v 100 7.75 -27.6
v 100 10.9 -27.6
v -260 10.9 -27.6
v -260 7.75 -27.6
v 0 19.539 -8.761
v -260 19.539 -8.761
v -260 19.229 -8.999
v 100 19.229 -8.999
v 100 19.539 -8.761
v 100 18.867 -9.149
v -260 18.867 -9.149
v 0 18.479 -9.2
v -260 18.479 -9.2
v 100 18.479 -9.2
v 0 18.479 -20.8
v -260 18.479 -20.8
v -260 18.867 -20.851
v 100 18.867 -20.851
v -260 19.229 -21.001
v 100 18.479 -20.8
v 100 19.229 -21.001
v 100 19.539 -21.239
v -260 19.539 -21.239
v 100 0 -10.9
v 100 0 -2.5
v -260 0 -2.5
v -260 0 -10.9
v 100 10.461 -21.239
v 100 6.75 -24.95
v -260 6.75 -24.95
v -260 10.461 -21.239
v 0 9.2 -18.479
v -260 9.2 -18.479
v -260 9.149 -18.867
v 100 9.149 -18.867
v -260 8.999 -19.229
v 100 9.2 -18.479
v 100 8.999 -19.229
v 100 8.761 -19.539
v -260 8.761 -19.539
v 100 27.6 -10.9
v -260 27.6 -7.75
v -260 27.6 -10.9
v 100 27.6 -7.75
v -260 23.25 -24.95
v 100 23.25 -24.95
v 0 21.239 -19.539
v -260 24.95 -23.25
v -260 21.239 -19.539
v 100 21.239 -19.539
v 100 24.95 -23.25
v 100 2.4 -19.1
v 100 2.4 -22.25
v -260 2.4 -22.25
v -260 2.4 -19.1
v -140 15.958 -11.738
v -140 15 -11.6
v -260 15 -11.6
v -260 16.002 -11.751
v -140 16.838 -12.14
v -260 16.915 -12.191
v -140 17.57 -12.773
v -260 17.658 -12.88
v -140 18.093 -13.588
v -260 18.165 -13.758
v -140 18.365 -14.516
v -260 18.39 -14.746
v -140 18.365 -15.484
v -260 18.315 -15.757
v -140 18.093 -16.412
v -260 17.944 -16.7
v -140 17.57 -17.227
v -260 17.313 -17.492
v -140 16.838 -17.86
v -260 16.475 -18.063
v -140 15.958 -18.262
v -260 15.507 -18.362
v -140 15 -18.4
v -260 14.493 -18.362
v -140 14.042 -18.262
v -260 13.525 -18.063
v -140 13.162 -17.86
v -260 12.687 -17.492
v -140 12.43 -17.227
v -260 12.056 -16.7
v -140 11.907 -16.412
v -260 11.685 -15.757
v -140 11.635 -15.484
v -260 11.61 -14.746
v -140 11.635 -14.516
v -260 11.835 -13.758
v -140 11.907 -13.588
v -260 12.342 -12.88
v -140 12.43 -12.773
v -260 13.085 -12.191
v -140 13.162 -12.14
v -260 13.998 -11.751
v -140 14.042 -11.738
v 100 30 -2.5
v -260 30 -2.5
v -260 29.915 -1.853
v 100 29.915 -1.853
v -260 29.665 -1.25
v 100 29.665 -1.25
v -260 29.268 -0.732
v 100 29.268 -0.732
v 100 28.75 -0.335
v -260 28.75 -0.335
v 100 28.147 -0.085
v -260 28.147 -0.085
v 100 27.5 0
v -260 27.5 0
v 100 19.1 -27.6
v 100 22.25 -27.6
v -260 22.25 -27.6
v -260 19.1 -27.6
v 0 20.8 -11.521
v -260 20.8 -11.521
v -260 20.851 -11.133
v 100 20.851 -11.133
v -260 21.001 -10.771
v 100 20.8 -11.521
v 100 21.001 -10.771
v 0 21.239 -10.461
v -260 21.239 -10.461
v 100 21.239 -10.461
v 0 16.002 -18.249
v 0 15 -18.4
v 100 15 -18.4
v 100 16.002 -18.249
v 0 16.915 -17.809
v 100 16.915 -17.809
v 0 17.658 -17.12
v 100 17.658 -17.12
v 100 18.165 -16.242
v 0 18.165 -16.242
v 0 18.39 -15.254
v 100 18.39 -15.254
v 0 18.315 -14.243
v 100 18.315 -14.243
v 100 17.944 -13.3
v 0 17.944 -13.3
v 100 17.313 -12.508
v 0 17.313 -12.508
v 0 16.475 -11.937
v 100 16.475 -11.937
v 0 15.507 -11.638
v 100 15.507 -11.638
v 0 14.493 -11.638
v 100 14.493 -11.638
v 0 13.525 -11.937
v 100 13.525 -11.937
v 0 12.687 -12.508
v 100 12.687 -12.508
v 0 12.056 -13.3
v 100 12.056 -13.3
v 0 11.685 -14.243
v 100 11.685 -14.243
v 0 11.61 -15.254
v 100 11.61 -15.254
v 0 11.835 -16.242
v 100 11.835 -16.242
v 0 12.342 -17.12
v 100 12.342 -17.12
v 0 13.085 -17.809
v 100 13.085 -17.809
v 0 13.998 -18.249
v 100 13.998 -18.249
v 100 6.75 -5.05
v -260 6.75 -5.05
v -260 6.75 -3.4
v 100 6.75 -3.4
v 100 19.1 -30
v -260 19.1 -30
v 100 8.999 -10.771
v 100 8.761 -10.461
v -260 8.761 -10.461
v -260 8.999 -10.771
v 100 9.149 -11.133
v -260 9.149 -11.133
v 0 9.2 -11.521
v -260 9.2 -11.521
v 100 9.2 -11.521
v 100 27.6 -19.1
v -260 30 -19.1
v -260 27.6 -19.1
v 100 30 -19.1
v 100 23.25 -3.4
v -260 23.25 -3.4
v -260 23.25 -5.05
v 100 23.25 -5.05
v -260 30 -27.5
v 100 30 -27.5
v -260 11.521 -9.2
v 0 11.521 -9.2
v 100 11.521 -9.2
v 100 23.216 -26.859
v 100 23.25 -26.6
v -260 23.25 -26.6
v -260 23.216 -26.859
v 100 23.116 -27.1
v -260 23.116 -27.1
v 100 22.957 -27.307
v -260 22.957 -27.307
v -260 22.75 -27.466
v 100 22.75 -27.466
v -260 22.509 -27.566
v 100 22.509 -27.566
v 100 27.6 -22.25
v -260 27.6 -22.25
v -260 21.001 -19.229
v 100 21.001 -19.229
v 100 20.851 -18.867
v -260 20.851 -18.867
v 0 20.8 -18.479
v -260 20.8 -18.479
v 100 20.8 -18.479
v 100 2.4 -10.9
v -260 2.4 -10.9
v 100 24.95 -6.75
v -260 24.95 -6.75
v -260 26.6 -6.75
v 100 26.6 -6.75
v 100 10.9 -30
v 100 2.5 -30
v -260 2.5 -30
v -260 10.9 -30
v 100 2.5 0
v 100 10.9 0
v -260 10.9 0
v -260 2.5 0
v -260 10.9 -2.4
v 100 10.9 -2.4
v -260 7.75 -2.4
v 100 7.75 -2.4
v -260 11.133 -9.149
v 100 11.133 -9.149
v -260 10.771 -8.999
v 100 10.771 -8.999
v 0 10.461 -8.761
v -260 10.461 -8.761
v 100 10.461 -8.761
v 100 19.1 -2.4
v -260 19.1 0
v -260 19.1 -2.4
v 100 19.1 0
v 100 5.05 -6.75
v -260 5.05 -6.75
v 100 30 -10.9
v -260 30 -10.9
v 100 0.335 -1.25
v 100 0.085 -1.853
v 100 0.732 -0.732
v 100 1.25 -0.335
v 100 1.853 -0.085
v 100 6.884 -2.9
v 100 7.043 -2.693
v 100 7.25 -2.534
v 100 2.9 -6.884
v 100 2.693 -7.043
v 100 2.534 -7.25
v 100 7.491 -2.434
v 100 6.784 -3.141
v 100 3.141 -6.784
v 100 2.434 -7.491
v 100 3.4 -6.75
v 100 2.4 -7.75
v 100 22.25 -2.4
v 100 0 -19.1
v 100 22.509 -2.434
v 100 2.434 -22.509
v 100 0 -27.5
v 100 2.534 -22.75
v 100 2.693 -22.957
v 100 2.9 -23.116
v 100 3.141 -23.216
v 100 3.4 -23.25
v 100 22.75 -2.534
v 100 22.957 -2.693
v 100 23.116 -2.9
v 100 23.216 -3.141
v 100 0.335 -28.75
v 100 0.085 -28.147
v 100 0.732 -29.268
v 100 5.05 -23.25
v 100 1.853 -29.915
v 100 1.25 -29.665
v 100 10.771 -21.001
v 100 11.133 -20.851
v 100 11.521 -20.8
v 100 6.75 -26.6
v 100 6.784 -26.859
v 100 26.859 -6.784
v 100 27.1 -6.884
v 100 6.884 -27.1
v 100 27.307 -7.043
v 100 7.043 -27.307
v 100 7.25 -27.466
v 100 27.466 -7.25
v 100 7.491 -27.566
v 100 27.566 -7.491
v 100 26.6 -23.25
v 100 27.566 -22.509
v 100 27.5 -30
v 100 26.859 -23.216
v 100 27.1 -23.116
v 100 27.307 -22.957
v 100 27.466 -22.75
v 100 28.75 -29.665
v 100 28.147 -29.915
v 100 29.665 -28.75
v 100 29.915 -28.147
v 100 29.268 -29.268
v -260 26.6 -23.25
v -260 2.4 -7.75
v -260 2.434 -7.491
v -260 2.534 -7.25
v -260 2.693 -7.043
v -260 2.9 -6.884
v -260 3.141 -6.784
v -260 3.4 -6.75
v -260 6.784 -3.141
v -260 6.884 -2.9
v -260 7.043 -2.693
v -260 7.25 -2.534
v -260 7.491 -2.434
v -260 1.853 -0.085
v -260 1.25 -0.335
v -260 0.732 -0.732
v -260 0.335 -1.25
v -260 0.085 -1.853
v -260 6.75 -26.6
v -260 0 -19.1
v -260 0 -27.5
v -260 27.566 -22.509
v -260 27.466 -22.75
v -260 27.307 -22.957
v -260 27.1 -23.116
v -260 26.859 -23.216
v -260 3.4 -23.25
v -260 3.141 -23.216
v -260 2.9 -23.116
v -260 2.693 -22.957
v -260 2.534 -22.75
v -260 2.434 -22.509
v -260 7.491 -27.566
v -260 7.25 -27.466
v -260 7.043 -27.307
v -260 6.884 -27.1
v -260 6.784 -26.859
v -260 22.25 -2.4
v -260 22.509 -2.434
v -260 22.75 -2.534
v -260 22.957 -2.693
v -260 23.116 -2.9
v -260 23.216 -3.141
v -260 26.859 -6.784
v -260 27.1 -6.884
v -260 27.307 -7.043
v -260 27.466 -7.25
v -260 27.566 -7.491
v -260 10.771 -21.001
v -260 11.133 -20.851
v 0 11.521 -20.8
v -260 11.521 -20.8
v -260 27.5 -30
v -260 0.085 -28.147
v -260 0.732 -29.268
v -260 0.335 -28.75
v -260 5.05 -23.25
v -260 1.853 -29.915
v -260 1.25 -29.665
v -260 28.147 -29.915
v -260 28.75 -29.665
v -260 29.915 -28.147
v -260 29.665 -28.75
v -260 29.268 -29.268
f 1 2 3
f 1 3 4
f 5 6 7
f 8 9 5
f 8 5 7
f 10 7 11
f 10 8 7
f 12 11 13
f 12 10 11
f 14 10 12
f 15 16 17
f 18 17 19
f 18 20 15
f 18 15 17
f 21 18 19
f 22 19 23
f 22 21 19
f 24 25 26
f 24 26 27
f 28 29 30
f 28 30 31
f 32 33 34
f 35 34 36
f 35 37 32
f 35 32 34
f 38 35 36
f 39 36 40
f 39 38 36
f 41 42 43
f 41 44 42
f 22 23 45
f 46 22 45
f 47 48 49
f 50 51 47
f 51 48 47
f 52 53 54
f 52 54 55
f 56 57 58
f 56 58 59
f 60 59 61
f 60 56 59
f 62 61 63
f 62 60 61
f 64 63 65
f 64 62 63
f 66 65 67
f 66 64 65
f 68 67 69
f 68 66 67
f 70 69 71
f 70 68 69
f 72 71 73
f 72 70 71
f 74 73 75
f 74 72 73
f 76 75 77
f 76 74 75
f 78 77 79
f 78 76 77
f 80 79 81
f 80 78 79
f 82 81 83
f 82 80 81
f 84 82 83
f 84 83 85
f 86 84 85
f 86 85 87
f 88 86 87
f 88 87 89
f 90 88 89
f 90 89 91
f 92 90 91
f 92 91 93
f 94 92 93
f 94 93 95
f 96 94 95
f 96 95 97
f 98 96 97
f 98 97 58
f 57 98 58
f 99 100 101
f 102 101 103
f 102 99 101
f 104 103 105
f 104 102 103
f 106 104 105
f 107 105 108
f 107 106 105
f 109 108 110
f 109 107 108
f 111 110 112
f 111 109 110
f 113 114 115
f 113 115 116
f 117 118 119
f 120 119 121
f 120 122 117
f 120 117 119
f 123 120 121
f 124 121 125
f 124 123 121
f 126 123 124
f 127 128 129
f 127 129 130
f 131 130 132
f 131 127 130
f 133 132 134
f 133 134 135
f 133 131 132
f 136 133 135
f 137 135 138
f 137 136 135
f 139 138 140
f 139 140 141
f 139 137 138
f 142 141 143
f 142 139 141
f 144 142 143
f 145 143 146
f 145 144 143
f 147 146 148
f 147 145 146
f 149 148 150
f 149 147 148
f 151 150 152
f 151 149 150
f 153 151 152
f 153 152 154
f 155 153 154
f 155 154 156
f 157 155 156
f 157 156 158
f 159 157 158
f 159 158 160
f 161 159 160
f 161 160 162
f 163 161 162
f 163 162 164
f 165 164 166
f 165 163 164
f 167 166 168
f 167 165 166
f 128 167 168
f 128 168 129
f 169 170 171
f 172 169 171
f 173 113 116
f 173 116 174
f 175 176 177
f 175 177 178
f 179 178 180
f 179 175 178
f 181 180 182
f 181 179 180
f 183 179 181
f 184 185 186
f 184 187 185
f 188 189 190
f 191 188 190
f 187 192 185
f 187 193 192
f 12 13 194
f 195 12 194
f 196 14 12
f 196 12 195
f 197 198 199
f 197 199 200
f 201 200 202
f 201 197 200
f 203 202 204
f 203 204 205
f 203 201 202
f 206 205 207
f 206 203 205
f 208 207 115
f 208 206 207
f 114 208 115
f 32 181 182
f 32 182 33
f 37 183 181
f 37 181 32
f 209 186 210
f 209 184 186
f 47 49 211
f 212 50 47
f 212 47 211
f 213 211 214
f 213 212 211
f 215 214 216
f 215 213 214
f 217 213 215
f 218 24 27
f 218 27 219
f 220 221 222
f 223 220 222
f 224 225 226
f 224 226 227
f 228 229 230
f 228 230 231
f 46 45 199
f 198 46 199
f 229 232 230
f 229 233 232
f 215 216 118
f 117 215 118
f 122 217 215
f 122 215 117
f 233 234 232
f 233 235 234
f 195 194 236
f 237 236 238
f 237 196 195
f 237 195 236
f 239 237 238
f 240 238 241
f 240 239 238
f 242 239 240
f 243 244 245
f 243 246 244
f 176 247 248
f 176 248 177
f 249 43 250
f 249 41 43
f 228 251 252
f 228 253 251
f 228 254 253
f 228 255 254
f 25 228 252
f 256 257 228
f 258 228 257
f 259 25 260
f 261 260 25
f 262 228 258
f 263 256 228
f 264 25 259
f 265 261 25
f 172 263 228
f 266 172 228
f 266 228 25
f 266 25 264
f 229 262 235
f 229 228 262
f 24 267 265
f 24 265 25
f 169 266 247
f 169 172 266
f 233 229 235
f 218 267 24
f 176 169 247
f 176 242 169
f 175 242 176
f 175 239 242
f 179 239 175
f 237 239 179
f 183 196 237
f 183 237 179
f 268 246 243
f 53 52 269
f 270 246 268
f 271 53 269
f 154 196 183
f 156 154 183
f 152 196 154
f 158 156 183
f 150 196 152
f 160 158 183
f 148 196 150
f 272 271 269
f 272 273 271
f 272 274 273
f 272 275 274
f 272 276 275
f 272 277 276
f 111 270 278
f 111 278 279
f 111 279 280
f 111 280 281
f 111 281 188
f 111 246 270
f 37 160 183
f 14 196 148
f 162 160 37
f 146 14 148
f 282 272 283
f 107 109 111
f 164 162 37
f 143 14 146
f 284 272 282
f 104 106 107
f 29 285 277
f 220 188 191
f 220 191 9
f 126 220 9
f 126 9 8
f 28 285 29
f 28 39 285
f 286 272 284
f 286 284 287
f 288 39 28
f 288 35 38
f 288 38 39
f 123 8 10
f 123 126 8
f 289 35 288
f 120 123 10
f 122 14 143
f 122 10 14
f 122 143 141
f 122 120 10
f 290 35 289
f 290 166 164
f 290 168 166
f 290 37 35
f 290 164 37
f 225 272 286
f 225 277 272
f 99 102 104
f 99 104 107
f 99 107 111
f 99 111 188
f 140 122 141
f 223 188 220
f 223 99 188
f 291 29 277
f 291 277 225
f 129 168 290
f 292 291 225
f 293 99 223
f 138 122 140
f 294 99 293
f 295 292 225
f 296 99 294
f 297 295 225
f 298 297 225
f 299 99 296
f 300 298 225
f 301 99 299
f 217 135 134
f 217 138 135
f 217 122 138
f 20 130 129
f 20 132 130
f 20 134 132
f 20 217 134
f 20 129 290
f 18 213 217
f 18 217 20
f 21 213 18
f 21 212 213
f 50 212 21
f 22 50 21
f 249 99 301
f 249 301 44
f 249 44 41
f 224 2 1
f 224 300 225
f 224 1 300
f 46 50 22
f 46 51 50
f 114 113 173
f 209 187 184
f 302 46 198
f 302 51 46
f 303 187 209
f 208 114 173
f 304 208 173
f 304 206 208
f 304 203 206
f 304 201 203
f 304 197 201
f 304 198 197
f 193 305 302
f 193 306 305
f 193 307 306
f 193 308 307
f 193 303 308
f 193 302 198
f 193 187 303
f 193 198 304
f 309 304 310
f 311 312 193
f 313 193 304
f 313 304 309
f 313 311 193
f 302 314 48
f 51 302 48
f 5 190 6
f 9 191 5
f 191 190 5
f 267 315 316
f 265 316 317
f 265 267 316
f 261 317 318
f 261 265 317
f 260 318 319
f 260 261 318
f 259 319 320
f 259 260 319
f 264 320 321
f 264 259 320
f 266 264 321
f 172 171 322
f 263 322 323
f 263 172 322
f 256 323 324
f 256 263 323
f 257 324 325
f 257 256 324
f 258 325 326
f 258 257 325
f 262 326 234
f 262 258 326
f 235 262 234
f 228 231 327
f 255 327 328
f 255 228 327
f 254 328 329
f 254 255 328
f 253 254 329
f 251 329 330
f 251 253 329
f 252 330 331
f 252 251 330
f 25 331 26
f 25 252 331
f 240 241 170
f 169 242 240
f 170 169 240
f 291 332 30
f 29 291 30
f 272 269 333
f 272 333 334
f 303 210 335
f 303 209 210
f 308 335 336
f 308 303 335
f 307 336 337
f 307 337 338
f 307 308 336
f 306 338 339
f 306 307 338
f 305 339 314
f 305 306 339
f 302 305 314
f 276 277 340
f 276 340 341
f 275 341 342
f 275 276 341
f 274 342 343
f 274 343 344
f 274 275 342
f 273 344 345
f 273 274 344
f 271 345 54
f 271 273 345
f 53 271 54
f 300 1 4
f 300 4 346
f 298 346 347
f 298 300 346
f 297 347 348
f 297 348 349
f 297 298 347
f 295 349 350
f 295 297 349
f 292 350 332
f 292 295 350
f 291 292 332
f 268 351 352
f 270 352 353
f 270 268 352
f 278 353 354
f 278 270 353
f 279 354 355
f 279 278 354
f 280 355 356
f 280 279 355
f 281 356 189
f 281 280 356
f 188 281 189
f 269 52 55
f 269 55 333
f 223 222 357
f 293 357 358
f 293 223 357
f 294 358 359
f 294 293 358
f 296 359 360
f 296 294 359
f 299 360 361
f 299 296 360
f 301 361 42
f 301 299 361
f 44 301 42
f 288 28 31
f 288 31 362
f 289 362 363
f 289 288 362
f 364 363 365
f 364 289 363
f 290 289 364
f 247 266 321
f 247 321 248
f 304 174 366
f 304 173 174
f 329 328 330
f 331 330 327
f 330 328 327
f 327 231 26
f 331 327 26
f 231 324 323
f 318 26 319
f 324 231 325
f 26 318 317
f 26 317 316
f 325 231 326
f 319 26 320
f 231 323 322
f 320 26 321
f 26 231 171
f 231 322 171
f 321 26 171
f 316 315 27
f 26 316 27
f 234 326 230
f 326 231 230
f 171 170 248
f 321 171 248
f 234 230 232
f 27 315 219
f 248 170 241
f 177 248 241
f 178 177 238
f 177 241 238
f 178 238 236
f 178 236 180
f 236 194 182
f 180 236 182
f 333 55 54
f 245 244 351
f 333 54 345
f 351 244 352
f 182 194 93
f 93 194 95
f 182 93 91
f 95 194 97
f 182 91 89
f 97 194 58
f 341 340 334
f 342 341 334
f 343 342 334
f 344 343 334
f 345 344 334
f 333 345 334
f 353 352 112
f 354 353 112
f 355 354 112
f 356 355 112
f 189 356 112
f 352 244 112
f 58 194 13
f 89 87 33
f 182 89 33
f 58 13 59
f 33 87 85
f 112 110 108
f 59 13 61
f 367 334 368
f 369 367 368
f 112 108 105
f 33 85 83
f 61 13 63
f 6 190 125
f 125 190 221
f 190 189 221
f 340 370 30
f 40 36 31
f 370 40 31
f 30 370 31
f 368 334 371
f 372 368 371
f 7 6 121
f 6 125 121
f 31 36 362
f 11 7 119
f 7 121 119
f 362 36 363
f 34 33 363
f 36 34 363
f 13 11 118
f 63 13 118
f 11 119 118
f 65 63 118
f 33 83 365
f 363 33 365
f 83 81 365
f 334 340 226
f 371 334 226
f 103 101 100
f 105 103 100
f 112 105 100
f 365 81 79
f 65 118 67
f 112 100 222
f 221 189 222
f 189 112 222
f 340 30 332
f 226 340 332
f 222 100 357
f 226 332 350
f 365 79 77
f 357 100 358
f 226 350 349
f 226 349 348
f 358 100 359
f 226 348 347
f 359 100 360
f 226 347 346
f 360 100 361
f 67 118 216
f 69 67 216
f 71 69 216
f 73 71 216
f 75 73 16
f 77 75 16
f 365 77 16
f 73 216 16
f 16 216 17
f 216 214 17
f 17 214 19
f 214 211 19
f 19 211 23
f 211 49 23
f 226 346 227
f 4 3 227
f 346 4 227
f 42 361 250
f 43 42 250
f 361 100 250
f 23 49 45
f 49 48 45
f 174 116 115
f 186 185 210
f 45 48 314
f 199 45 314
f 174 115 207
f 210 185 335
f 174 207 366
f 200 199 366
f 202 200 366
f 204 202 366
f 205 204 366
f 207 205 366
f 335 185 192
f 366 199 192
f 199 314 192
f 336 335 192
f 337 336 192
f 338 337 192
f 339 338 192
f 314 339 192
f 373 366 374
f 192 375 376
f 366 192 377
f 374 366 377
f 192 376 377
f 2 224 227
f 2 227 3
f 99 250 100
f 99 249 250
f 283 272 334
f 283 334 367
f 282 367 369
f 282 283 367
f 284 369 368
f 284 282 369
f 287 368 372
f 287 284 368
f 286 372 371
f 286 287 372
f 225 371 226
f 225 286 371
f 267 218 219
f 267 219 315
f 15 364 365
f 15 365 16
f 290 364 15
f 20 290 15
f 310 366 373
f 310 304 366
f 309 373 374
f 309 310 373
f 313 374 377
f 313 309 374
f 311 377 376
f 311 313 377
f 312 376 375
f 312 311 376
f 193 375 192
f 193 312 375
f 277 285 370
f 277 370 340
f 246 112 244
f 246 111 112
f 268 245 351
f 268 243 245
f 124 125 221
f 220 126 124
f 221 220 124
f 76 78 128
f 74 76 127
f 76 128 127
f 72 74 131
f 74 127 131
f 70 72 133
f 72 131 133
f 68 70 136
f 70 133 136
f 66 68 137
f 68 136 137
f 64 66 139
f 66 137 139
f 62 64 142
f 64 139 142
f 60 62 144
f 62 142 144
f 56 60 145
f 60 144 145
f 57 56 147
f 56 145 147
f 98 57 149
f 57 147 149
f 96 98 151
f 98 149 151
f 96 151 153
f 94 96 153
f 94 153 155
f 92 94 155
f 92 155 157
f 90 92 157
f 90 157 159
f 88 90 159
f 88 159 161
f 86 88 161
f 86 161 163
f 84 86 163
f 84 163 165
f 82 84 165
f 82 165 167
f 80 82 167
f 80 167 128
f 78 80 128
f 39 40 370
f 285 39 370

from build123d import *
from build123d.topology import SkipClean

# Parameters (mm, degrees)
SKETCH1_R           = 3.4
BOSS_EXTRUDE2_DEPTH = 100
FILLET5_R           = 2.5
FILLET6_R           = 1.5
FILLET7_R           = 1.5
FILLET8_R           = 1
SKETCH3_R           = 3.4
BOSS_EXTRUDE3_DEPTH = 140
SKETCH7_R           = 3.4
BOSS_EXTRUDE4_DEPTH = 120


with BuildPart() as part:
    # Sketch1 → Boss-Extrude2 (new body)
    with BuildSketch(Plane(origin=(0, 0, 0), x_dir=(0, 0, -1), z_dir=(1, 0, 0))):
        Polygon((10.9, 0), (10.9, 2.4), (6.75, 2.4), (6.75, 5.05), (10.9, 9.2), (19.1, 9.2), (23.25, 5.05), (23.25, 2.4), (19.1, 2.4), (19.1, 0), (30, 0), (30, 10.9), (27.6, 10.9), (27.6, 6.75), (24.95, 6.75), (20.8, 10.9), (20.8, 19.1), (24.95, 23.25), (27.6, 23.25), (27.6, 19.1), (30, 19.1), (30, 30), (19.1, 30), (19.1, 27.6), (23.25, 27.6), (23.25, 24.95), (19.1, 20.8), (10.9, 20.8), (6.75, 24.95), (6.75, 27.6), (10.9, 27.6), (10.9, 30), (0, 30), (0, 19.1), (2.4, 19.1), (2.4, 23.25), (5.05, 23.25), (9.2, 19.1), (9.2, 10.9), (5.05, 6.75), (2.4, 6.75), (2.4, 10.9), (0, 10.9), (0, 0), align=None)
        with Locations((15, 15)):
            Circle(SKETCH1_R, mode=Mode.SUBTRACT)
    extrude(amount=BOSS_EXTRUDE2_DEPTH)

    # Fillet5
    fillet5_edges = [part.edges().sort_by_distance(p)[0] for p in [
        (50, 30, 0),
        (50, 30, -30),
        (50, 0, -30),
        (50, 0, 0),
    ]]
    fillet(fillet5_edges, radius=FILLET5_R)

    # Fillet6
    fillet6_edges = [part.edges().sort_by_distance(p)[0] for p in [
        (50, 10.9, -9.2),
        (50, 19.1, -9.2),
        (50, 19.1, -20.8),
        (50, 10.9, -20.8),
        (50, 9.2, -19.1),
        (50, 9.2, -10.9),
    ]]
    fillet(fillet6_edges, radius=FILLET6_R)

    # Fillet7
    fillet7_edges = [part.edges().sort_by_distance(p)[0] for p in [
        (50, 20.8, -10.9),
        (50, 20.8, -19.1),
    ]]
    fillet(fillet7_edges, radius=FILLET7_R)

    # Fillet8
    fillet8_edges = [part.edges().sort_by_distance(p)[0] for p in [
        (50, 6.75, -2.4),
        (50, 23.25, -2.4),
        (50, 27.6, -6.75),
        (50, 27.6, -23.25),
        (50, 23.25, -27.6),
        (50, 6.75, -27.6),
        (50, 2.4, -23.25),
        (50, 2.4, -6.75),
    ]]
    fillet(fillet8_edges, radius=FILLET8_R)

    # Sketch3 → Boss-Extrude3 (add)
    with BuildSketch(Plane(origin=(0, 0, 0), x_dir=(0, 0, -1), z_dir=(1, 0, 0))):
        with BuildLine():
            Line((10.9, 27.6), (10.9, 30))
            Line((10.9, 30), (2.5, 30))
            ThreePointArc((2.5, 30), (0.732233047, 29.267766953), (0, 27.5))
            Line((0, 27.5), (0, 19.1))
            Line((0, 19.1), (2.4, 19.1))
            Line((2.4, 19.1), (2.4, 22.25))
            ThreePointArc((2.4, 22.25), (2.692893219, 22.957106781), (3.4, 23.25))
            Line((3.4, 23.25), (5.05, 23.25))
            Line((5.05, 23.25), (8.760660172, 19.539339828))
            ThreePointArc((8.760660172, 19.539339828), (9.085819299, 19.052704805), (9.2, 18.478679656))
            Line((9.2, 18.478679656), (9.2, 11.521320344))
            ThreePointArc((9.2, 11.521320344), (9.085819299, 10.947295195), (8.760660172, 10.460660172))
            Line((8.760660172, 10.460660172), (5.05, 6.75))
            Line((5.05, 6.75), (3.4, 6.75))
            ThreePointArc((3.4, 6.75), (2.692893219, 7.042893219), (2.4, 7.75))
            Line((2.4, 7.75), (2.4, 10.9))
            Line((2.4, 10.9), (0, 10.9))
            Line((0, 10.9), (0, 2.5))
            ThreePointArc((0, 2.5), (0.732233047, 0.732233047), (2.5, 0))
            Line((2.5, 0), (10.9, 0))
            Line((10.9, 0), (10.9, 2.4))
            Line((10.9, 2.4), (7.75, 2.4))
            ThreePointArc((7.75, 2.4), (7.042893219, 2.692893219), (6.75, 3.4))
            Line((6.75, 3.4), (6.75, 5.05))
            Line((6.75, 5.05), (10.460660172, 8.760660172))
            ThreePointArc((10.460660172, 8.760660172), (10.947295195, 9.085819299), (11.521320344, 9.2))
            Line((11.521320344, 9.2), (18.478679656, 9.2))
            ThreePointArc((18.478679656, 9.2), (19.052704805, 9.085819299), (19.539339828, 8.760660172))
            Line((19.539339828, 8.760660172), (23.25, 5.05))
            Line((23.25, 5.05), (23.25, 3.4))
            ThreePointArc((23.25, 3.4), (22.957106781, 2.692893219), (22.25, 2.4))
            Line((22.25, 2.4), (19.1, 2.4))
            Line((19.1, 2.4), (19.1, 0))
            Line((19.1, 0), (27.5, 0))
            ThreePointArc((27.5, 0), (29.267766953, 0.732233047), (30, 2.5))
            Line((30, 2.5), (30, 10.9))
            Line((30, 10.9), (27.6, 10.9))
            Line((27.6, 10.9), (27.6, 7.75))
            ThreePointArc((27.6, 7.75), (27.307106781, 7.042893219), (26.6, 6.75))
            Line((26.6, 6.75), (24.95, 6.75))
            Line((24.95, 6.75), (21.239339828, 10.460660172))
            ThreePointArc((21.239339828, 10.460660172), (20.914180701, 10.947295195), (20.8, 11.521320344))
            Line((20.8, 11.521320344), (20.8, 18.478679656))
            ThreePointArc((20.8, 18.478679656), (20.914180701, 19.052704805), (21.239339828, 19.539339828))
            Line((21.239339828, 19.539339828), (24.95, 23.25))
            Line((24.95, 23.25), (26.6, 23.25))
            ThreePointArc((26.6, 23.25), (27.307106781, 22.957106781), (27.6, 22.25))
            Line((27.6, 22.25), (27.6, 19.1))
            Line((27.6, 19.1), (30, 19.1))
            Line((30, 19.1), (30, 27.5))
            ThreePointArc((30, 27.5), (29.267766953, 29.267766953), (27.5, 30))
            Line((27.5, 30), (19.1, 30))
            Line((19.1, 30), (19.1, 27.6))
            Line((19.1, 27.6), (22.25, 27.6))
            ThreePointArc((22.25, 27.6), (22.957106781, 27.307106781), (23.25, 26.6))
            Line((23.25, 26.6), (23.25, 24.95))
            Line((23.25, 24.95), (19.539339828, 21.239339828))
            ThreePointArc((19.539339828, 21.239339828), (19.052704805, 20.914180701), (18.478679656, 20.8))
            Line((18.478679656, 20.8), (11.521320344, 20.8))
            ThreePointArc((11.521320344, 20.8), (10.947295195, 20.914180701), (10.460660172, 21.239339828))
            Line((10.460660172, 21.239339828), (6.75, 24.95))
            Line((6.75, 24.95), (6.75, 26.6))
            ThreePointArc((6.75, 26.6), (7.042893219, 27.307106781), (7.75, 27.6))
            Line((7.75, 27.6), (10.9, 27.6))
        make_face()
        with Locations((15, 15)):
            Circle(SKETCH3_R, mode=Mode.SUBTRACT)
    extrude(amount=-BOSS_EXTRUDE3_DEPTH)

    # Sketch7 → Boss-Extrude4 (add)
    with SkipClean():  # the faces are left unmerged after this step: merging them gives an invalid solid
        with BuildSketch(Plane.ZY.offset(140)):
            with BuildLine():
                Line((-2.4, 10.9), (0, 10.9))
                Line((0, 10.9), (0, 2.5))
                ThreePointArc((0, 2.5), (-0.732233047, 0.732233047), (-2.5, 0))
                Line((-2.5, 0), (-10.9, 0))
                Line((-10.9, 0), (-10.9, 2.4))
                Line((-10.9, 2.4), (-7.75, 2.4))
                ThreePointArc((-7.75, 2.4), (-7.042893219, 2.692893219), (-6.75, 3.4))
                Line((-6.75, 3.4), (-6.75, 5.05))
                Line((-6.75, 5.05), (-10.460660172, 8.760660172))
                ThreePointArc((-10.460660172, 8.760660172), (-10.947295195, 9.085819299), (-11.521320344, 9.2))
                Line((-11.521320344, 9.2), (-18.478679656, 9.2))
                ThreePointArc((-18.478679656, 9.2), (-19.052704805, 9.085819299), (-19.539339828, 8.760660172))
                Line((-19.539339828, 8.760660172), (-23.25, 5.05))
                Line((-23.25, 5.05), (-23.25, 3.4))
                ThreePointArc((-23.25, 3.4), (-22.957106781, 2.692893219), (-22.25, 2.4))
                Line((-22.25, 2.4), (-19.1, 2.4))
                Line((-19.1, 2.4), (-19.1, 0))
                Line((-19.1, 0), (-27.5, 0))
                ThreePointArc((-27.5, 0), (-29.267766953, 0.732233047), (-30, 2.5))
                Line((-30, 2.5), (-30, 10.9))
                Line((-30, 10.9), (-27.6, 10.9))
                Line((-27.6, 10.9), (-27.6, 7.75))
                ThreePointArc((-27.6, 7.75), (-27.307106781, 7.042893219), (-26.6, 6.75))
                Line((-26.6, 6.75), (-24.95, 6.75))
                Line((-24.95, 6.75), (-21.239339828, 10.460660172))
                ThreePointArc((-21.239339828, 10.460660172), (-20.914180701, 10.947295195), (-20.8, 11.521320344))
                Line((-20.8, 11.521320344), (-20.8, 18.478679656))
                ThreePointArc((-20.8, 18.478679656), (-20.914180701, 19.052704805), (-21.239339828, 19.539339828))
                Line((-21.239339828, 19.539339828), (-24.95, 23.25))
                Line((-24.95, 23.25), (-26.6, 23.25))
                ThreePointArc((-26.6, 23.25), (-27.307106781, 22.957106781), (-27.6, 22.25))
                Line((-27.6, 22.25), (-27.6, 19.1))
                Line((-27.6, 19.1), (-30, 19.1))
                Line((-30, 19.1), (-30, 27.5))
                ThreePointArc((-30, 27.5), (-29.267766953, 29.267766953), (-27.5, 30))
                Line((-27.5, 30), (-19.1, 30))
                Line((-19.1, 30), (-19.1, 27.6))
                Line((-19.1, 27.6), (-22.25, 27.6))
                ThreePointArc((-22.25, 27.6), (-22.957106781, 27.307106781), (-23.25, 26.6))
                Line((-23.25, 26.6), (-23.25, 24.95))
                Line((-23.25, 24.95), (-19.539339828, 21.239339828))
                ThreePointArc((-19.539339828, 21.239339828), (-19.052704805, 20.914180701), (-18.478679656, 20.8))
                Line((-18.478679656, 20.8), (-11.521320344, 20.8))
                ThreePointArc((-11.521320344, 20.8), (-10.947295195, 20.914180701), (-10.460660172, 21.239339828))
                Line((-10.460660172, 21.239339828), (-6.75, 24.95))
                Line((-6.75, 24.95), (-6.75, 26.6))
                ThreePointArc((-6.75, 26.6), (-7.042893219, 27.307106781), (-7.75, 27.6))
                Line((-7.75, 27.6), (-10.9, 27.6))
                Line((-10.9, 27.6), (-10.9, 30))
                Line((-10.9, 30), (-2.5, 30))
                ThreePointArc((-2.5, 30), (-0.732233047, 29.267766953), (0, 27.5))
                Line((0, 27.5), (0, 19.1))
                Line((0, 19.1), (-2.4, 19.1))
                Line((-2.4, 19.1), (-2.4, 22.25))
                ThreePointArc((-2.4, 22.25), (-2.692893219, 22.957106781), (-3.4, 23.25))
                Line((-3.4, 23.25), (-5.05, 23.25))
                Line((-5.05, 23.25), (-8.760660172, 19.539339828))
                ThreePointArc((-8.760660172, 19.539339828), (-9.085819299, 19.052704805), (-9.2, 18.478679656))
                Line((-9.2, 18.478679656), (-9.2, 11.521320344))
                ThreePointArc((-9.2, 11.521320344), (-9.085819299, 10.947295195), (-8.760660172, 10.460660172))
                Line((-8.760660172, 10.460660172), (-5.05, 6.75))
                Line((-5.05, 6.75), (-3.4, 6.75))
                ThreePointArc((-3.4, 6.75), (-2.692893219, 7.042893219), (-2.4, 7.75))
                Line((-2.4, 7.75), (-2.4, 10.9))
            make_face()
            with Locations((-15, 15)):
                Circle(SKETCH7_R, mode=Mode.SUBTRACT)
        extrude(amount=BOSS_EXTRUDE4_DEPTH)
    add(part.part.scale(1), mode=Mode.REPLACE)  # the faces are merged on a copy


solid = part.part
